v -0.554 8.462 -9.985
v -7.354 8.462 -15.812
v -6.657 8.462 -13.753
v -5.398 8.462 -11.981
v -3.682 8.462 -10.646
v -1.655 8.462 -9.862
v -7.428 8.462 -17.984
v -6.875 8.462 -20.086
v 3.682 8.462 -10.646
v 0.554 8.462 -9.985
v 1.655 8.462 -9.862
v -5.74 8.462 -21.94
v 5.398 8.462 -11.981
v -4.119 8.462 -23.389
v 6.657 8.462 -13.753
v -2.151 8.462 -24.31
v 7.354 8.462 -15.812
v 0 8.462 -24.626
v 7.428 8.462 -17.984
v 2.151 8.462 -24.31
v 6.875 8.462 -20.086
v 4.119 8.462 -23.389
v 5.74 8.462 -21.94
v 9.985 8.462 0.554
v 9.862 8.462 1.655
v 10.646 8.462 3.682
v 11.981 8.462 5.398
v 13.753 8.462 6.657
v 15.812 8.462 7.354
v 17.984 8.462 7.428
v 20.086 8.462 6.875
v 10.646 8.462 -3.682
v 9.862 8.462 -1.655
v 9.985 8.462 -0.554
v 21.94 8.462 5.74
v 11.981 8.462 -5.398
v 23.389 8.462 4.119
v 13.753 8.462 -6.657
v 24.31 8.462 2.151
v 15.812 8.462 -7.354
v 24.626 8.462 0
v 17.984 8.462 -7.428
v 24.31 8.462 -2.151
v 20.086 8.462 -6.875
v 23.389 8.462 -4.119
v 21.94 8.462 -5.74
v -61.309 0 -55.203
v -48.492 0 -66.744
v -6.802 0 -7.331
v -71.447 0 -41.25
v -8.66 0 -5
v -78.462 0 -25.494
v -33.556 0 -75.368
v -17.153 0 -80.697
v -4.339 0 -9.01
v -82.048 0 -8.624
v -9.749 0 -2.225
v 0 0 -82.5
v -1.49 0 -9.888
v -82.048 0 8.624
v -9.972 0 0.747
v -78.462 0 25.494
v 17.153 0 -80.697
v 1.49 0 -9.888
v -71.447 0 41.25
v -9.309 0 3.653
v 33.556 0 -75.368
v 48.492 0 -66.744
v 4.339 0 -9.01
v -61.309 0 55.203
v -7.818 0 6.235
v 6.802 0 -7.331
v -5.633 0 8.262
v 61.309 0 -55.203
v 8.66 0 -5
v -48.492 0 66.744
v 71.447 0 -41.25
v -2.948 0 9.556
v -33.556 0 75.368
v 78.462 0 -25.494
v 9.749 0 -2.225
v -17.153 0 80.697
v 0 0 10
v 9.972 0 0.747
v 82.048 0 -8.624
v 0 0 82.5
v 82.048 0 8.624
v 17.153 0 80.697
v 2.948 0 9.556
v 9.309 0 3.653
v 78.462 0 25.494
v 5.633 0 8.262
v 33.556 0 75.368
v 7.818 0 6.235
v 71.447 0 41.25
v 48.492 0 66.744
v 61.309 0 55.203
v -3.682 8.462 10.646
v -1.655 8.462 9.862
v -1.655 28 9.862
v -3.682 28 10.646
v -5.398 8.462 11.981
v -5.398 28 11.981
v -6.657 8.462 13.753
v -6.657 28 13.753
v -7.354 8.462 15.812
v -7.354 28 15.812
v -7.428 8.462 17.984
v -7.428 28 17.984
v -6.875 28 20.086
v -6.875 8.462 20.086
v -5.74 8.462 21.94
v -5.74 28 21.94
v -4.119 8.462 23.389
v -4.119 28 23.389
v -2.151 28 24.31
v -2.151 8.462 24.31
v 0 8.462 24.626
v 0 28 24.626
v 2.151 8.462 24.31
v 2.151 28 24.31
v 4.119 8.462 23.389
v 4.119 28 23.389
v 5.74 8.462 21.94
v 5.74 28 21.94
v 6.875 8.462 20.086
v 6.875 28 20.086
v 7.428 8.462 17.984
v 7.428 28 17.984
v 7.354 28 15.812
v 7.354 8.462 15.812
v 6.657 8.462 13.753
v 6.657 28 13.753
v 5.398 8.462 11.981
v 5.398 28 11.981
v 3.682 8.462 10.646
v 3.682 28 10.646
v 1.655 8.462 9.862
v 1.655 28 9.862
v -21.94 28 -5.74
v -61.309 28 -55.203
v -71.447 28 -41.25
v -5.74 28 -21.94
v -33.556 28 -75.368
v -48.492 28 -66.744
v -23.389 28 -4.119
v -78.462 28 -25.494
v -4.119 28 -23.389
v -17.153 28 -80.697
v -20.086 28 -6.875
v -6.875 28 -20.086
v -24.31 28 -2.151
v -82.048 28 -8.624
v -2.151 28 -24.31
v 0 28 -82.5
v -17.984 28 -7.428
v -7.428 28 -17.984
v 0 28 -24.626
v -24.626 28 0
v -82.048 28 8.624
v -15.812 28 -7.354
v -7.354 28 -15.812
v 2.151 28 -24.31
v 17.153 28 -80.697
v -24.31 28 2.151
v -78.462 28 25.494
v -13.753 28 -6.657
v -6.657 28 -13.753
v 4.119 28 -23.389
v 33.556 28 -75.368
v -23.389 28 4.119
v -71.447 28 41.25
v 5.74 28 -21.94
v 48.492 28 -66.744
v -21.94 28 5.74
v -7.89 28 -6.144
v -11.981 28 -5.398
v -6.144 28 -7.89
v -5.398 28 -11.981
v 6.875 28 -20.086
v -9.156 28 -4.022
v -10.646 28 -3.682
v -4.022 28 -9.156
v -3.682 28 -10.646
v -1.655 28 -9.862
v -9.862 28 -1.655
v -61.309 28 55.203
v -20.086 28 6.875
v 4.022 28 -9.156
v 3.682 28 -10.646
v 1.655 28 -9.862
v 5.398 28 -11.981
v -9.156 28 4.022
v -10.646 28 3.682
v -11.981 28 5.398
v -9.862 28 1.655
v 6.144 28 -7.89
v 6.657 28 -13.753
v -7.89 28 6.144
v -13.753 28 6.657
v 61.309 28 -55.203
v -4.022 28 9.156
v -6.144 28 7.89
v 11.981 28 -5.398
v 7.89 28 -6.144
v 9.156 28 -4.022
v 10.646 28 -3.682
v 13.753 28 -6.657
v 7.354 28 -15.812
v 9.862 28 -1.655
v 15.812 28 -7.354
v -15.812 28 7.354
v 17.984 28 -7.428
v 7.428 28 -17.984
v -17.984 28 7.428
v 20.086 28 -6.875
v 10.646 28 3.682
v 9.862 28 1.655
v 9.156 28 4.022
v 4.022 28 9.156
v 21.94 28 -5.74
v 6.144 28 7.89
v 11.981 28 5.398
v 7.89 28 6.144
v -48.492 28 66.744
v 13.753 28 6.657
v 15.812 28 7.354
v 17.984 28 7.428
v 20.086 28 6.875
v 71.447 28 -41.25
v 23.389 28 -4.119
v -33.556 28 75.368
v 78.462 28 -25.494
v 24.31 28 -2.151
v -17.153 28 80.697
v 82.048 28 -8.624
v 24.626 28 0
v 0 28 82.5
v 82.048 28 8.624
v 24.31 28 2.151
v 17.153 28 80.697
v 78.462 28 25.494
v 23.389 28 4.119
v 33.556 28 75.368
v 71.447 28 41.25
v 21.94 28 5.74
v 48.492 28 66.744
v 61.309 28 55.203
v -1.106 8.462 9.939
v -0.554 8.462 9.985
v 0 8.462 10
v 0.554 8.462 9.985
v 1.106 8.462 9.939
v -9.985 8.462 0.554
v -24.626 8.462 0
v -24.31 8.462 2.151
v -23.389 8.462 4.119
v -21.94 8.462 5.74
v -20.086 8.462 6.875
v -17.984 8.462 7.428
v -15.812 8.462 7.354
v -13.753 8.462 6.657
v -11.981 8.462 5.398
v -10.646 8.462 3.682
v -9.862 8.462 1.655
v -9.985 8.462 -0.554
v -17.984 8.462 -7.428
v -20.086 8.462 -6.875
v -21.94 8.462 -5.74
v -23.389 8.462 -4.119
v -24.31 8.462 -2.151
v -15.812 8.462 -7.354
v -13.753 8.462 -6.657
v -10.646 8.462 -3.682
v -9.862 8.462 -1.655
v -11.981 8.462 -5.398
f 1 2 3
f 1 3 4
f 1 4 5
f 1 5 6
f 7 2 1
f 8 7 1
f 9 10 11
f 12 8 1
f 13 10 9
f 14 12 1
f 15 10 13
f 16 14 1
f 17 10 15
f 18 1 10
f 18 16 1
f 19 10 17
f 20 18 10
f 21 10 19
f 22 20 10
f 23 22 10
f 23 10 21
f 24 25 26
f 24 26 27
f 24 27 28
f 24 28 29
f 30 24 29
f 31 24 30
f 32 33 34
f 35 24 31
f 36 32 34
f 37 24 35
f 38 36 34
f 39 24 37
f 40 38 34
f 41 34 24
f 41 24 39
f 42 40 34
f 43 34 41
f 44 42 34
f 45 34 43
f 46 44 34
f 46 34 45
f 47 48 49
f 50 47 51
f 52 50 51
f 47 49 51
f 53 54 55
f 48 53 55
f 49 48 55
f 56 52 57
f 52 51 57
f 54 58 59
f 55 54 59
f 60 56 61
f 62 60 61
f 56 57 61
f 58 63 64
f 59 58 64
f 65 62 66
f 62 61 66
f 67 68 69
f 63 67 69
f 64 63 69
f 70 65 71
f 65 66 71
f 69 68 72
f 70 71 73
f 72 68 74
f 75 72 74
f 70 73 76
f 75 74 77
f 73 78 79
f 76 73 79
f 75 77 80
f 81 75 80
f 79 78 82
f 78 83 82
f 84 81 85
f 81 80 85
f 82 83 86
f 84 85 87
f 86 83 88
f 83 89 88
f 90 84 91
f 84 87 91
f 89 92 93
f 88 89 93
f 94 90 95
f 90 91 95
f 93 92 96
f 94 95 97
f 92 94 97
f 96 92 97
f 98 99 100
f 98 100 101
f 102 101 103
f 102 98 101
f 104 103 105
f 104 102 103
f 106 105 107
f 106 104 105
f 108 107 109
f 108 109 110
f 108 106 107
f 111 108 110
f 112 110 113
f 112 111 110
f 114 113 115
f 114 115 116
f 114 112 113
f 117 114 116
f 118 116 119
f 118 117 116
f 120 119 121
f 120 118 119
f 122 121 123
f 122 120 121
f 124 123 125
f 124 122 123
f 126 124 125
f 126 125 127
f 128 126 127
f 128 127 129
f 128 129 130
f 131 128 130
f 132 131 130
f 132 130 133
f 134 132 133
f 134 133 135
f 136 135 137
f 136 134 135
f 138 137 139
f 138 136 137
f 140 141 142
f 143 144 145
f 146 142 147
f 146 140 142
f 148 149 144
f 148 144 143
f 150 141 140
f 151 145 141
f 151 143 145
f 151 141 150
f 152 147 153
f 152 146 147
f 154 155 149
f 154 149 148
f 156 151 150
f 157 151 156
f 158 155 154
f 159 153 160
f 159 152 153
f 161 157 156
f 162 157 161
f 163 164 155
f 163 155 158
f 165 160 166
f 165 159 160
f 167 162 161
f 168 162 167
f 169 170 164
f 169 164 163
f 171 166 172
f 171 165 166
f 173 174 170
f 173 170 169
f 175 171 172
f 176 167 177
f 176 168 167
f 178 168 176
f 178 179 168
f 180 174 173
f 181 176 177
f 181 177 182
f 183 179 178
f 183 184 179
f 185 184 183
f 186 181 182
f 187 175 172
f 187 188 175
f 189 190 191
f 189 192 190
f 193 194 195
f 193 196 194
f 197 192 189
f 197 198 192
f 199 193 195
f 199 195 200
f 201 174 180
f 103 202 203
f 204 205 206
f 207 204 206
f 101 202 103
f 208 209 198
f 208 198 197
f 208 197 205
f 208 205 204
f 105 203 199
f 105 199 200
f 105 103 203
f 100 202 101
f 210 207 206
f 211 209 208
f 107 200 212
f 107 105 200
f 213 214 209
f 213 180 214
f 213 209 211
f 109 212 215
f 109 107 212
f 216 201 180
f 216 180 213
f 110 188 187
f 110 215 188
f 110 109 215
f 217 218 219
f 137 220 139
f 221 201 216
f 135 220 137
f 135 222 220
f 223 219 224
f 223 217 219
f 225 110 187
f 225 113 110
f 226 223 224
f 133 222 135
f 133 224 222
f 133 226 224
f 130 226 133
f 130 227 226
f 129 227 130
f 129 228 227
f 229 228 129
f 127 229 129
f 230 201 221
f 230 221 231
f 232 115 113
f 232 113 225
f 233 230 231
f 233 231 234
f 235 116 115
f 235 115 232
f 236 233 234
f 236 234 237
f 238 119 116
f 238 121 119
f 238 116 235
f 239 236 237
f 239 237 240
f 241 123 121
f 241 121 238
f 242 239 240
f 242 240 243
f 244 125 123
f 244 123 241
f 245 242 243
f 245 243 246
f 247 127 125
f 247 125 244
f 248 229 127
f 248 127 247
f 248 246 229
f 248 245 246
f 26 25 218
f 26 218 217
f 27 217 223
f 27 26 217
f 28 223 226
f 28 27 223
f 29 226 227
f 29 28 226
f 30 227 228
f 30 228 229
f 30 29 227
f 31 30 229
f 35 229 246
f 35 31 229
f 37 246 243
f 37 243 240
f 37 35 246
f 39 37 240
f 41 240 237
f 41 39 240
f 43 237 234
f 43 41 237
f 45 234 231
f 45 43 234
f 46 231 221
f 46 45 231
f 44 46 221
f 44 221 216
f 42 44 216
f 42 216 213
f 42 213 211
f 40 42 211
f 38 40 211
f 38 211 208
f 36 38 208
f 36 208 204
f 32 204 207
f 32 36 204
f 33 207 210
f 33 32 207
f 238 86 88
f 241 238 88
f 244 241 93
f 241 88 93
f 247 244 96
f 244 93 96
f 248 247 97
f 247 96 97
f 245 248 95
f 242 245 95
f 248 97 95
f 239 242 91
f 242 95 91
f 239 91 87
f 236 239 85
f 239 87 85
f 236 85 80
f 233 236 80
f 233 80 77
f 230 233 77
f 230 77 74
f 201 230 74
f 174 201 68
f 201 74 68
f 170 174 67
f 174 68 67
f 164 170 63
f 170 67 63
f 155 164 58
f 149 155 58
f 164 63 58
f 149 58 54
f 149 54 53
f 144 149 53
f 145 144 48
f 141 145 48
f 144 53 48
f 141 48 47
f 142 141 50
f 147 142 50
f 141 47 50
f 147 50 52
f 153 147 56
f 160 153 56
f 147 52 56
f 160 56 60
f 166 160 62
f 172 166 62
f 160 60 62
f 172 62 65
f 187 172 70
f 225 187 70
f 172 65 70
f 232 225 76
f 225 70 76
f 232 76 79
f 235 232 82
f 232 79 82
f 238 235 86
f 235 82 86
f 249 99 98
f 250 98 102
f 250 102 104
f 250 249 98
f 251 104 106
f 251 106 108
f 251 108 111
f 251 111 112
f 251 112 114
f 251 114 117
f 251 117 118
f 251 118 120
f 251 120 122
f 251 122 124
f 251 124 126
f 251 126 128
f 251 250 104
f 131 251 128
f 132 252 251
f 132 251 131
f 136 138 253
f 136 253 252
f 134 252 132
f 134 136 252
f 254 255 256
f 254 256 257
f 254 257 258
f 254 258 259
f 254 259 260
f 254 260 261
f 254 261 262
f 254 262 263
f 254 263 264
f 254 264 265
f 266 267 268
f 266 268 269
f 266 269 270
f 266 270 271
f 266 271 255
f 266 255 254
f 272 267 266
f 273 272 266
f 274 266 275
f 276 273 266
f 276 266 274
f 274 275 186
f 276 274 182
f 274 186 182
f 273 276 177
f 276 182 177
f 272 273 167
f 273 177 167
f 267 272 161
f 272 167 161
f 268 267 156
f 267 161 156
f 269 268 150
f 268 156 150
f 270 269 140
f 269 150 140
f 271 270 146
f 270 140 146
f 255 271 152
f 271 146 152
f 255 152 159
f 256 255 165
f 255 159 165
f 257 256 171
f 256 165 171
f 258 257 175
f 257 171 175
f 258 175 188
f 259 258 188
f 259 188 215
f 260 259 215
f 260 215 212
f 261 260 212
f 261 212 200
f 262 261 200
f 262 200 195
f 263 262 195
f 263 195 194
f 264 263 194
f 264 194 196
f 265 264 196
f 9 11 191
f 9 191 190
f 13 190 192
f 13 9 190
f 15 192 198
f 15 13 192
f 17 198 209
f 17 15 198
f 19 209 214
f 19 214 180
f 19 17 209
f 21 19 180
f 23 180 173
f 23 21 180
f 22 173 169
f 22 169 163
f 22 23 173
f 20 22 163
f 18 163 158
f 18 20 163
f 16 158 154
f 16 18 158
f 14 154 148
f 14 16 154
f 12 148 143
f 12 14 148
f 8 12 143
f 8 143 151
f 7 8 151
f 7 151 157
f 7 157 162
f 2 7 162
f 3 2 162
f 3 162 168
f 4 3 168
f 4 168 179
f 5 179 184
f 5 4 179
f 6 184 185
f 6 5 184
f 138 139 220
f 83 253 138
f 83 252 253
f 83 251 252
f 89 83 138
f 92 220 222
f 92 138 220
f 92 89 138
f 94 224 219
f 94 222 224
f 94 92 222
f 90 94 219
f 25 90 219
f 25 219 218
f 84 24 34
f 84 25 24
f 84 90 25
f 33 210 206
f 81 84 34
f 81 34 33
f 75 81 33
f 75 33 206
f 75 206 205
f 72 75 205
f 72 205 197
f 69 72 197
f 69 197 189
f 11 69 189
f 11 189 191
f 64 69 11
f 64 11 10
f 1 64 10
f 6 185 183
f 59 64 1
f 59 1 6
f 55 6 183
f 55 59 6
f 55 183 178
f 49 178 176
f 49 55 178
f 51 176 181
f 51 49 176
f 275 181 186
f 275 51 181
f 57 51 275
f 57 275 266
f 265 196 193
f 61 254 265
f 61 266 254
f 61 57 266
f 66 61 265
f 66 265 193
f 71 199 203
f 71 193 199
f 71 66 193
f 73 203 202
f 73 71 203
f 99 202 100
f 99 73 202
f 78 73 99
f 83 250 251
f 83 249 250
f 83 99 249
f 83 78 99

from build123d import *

# Parameters (mm, degrees)
SKETCH1_R           = 82.5
BOSS_EXTRUDE1_DEPTH = 28
SKETCH2_R           = 10
CUT_EXTRUDE1_DEPTH  = 120.98541578
SKETCH3_R           = 7.474835821
CUT_EXTRUDE2_DEPTH  = 19.538330678
CIRPATTERN1_COUNT   = 4


with BuildPart() as part:
    # Sketch1 → Boss-Extrude1 (new body)
    with BuildSketch(Plane(origin=(0, 0, 0), x_dir=(1, 0, 0), z_dir=(0, 1, 0))):
        Circle(SKETCH1_R)
    extrude(amount=BOSS_EXTRUDE1_DEPTH)

    # Sketch2 → Cut-Extrude1 (cut, through all)
    with BuildSketch(Plane(origin=(0, 0, 0), x_dir=(1, 0, 0), z_dir=(0, 1, 0))):
        Circle(SKETCH2_R)
    extrude(amount=CUT_EXTRUDE1_DEPTH, mode=Mode.SUBTRACT)

    # Sketch3 → Cut-Extrude2 (cut)
    with BuildSketch(Plane(origin=(0, 28, 0), x_dir=(1, 0, 0), z_dir=(0, 1, 0))):
        with Locations((-17.151511033, 0)):
            Circle(SKETCH3_R)
    cut_extrude2 = extrude(amount=-CUT_EXTRUDE2_DEPTH, mode=Mode.SUBTRACT)

    # CirPattern1: Cut-Extrude2 ×4 about axis
    cirpattern1_axis = Axis((0, 0, 0), (0, 1, 0))
    for i in range(1, CIRPATTERN1_COUNT):
        add(cut_extrude2.rotate(cirpattern1_axis, i * 360 / CIRPATTERN1_COUNT), mode=Mode.SUBTRACT)


solid = part.part
